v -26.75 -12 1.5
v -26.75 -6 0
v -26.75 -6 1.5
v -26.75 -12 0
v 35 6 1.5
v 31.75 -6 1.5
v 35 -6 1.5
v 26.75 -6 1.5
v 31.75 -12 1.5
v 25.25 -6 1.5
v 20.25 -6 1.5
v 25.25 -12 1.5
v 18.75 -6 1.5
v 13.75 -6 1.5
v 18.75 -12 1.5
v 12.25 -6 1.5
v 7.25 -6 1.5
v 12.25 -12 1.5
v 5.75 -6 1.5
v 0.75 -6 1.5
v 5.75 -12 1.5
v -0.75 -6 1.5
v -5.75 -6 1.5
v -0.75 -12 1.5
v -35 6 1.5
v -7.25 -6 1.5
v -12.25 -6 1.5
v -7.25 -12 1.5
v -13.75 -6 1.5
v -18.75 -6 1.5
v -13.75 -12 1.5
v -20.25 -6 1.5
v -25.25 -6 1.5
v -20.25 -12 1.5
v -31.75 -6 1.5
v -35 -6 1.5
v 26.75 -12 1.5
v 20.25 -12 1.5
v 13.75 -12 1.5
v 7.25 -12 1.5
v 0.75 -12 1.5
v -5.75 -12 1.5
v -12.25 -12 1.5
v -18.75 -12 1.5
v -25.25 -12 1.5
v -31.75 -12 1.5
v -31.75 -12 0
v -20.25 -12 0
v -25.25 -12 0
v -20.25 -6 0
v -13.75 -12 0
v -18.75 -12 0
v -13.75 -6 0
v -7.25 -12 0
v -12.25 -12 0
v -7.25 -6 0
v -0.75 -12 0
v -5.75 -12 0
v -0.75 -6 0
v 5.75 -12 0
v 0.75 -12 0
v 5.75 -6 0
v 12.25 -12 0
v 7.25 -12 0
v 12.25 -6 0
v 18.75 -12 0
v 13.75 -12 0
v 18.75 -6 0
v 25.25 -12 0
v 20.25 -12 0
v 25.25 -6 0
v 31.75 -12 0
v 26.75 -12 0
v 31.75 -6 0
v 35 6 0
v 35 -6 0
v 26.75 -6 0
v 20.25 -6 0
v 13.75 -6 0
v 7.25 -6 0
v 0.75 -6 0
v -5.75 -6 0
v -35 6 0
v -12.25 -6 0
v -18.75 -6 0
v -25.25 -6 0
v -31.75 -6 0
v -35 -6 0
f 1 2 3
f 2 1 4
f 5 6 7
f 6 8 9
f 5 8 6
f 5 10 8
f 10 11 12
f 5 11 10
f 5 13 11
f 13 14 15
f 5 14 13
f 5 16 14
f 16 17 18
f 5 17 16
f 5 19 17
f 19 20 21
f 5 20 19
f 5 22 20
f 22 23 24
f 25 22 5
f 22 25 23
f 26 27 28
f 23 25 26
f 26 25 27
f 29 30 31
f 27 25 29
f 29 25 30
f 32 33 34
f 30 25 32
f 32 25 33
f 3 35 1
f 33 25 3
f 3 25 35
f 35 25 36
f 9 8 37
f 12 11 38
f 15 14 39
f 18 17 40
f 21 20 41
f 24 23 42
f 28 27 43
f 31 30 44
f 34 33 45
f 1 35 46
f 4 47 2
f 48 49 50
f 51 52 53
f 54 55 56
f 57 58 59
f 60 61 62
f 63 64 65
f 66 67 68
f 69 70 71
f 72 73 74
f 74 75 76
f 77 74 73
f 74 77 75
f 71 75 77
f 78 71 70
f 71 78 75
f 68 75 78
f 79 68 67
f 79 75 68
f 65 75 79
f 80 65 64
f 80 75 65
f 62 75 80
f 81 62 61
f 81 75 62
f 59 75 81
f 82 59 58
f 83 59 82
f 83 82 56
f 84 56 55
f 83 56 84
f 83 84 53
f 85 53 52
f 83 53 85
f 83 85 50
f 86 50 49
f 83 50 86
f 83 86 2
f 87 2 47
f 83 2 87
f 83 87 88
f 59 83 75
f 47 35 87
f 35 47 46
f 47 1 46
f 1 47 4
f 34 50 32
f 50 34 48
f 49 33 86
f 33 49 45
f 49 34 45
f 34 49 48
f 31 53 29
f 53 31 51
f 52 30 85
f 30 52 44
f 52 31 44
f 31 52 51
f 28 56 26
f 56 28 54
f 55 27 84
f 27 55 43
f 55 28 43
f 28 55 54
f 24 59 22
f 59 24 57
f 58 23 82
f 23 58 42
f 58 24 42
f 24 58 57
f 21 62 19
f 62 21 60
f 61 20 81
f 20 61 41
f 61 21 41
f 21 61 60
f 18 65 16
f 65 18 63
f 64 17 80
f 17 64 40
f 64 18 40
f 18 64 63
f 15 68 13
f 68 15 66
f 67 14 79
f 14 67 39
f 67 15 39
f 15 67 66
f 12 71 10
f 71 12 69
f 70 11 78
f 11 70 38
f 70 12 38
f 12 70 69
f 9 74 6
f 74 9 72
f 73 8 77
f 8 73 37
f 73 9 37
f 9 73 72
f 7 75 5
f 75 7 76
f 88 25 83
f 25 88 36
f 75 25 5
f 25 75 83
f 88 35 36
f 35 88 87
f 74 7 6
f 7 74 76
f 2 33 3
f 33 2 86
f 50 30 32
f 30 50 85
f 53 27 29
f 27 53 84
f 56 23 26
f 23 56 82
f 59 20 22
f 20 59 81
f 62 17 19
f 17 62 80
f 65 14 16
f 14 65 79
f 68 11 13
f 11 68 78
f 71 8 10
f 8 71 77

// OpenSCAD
// 10-well agarose gel casting comb
// Print orientation: flat on bed, teeth pointing down (-Y)

plate_t      = 1.5;   // plate thickness (Z)
spine_l      = 70;    // spine length (X)
spine_w      = 12;    // spine width (Y)
tooth_w      = 5;     // tooth width (X)
tooth_l      = 12;    // tooth length (Y)
tooth_count  = 10;    // number of teeth
tooth_gap    = 1.5;   // gap between teeth (X)
overlap      = 0.01;  // small overlap into spine for clean union

$fn = 64;

pitch = tooth_w + tooth_gap;

union() {
    // Spine
    translate([-spine_l/2, -spine_w/2, 0])
        cube([spine_l, spine_w, plate_t]);

    // Teeth
    for (i = [0 : tooth_count - 1])
        translate([(i - (tooth_count - 1)/2) * pitch - tooth_w/2, -tooth_l, 0])
            cube([tooth_w, tooth_l + overlap, plate_t]);
}
